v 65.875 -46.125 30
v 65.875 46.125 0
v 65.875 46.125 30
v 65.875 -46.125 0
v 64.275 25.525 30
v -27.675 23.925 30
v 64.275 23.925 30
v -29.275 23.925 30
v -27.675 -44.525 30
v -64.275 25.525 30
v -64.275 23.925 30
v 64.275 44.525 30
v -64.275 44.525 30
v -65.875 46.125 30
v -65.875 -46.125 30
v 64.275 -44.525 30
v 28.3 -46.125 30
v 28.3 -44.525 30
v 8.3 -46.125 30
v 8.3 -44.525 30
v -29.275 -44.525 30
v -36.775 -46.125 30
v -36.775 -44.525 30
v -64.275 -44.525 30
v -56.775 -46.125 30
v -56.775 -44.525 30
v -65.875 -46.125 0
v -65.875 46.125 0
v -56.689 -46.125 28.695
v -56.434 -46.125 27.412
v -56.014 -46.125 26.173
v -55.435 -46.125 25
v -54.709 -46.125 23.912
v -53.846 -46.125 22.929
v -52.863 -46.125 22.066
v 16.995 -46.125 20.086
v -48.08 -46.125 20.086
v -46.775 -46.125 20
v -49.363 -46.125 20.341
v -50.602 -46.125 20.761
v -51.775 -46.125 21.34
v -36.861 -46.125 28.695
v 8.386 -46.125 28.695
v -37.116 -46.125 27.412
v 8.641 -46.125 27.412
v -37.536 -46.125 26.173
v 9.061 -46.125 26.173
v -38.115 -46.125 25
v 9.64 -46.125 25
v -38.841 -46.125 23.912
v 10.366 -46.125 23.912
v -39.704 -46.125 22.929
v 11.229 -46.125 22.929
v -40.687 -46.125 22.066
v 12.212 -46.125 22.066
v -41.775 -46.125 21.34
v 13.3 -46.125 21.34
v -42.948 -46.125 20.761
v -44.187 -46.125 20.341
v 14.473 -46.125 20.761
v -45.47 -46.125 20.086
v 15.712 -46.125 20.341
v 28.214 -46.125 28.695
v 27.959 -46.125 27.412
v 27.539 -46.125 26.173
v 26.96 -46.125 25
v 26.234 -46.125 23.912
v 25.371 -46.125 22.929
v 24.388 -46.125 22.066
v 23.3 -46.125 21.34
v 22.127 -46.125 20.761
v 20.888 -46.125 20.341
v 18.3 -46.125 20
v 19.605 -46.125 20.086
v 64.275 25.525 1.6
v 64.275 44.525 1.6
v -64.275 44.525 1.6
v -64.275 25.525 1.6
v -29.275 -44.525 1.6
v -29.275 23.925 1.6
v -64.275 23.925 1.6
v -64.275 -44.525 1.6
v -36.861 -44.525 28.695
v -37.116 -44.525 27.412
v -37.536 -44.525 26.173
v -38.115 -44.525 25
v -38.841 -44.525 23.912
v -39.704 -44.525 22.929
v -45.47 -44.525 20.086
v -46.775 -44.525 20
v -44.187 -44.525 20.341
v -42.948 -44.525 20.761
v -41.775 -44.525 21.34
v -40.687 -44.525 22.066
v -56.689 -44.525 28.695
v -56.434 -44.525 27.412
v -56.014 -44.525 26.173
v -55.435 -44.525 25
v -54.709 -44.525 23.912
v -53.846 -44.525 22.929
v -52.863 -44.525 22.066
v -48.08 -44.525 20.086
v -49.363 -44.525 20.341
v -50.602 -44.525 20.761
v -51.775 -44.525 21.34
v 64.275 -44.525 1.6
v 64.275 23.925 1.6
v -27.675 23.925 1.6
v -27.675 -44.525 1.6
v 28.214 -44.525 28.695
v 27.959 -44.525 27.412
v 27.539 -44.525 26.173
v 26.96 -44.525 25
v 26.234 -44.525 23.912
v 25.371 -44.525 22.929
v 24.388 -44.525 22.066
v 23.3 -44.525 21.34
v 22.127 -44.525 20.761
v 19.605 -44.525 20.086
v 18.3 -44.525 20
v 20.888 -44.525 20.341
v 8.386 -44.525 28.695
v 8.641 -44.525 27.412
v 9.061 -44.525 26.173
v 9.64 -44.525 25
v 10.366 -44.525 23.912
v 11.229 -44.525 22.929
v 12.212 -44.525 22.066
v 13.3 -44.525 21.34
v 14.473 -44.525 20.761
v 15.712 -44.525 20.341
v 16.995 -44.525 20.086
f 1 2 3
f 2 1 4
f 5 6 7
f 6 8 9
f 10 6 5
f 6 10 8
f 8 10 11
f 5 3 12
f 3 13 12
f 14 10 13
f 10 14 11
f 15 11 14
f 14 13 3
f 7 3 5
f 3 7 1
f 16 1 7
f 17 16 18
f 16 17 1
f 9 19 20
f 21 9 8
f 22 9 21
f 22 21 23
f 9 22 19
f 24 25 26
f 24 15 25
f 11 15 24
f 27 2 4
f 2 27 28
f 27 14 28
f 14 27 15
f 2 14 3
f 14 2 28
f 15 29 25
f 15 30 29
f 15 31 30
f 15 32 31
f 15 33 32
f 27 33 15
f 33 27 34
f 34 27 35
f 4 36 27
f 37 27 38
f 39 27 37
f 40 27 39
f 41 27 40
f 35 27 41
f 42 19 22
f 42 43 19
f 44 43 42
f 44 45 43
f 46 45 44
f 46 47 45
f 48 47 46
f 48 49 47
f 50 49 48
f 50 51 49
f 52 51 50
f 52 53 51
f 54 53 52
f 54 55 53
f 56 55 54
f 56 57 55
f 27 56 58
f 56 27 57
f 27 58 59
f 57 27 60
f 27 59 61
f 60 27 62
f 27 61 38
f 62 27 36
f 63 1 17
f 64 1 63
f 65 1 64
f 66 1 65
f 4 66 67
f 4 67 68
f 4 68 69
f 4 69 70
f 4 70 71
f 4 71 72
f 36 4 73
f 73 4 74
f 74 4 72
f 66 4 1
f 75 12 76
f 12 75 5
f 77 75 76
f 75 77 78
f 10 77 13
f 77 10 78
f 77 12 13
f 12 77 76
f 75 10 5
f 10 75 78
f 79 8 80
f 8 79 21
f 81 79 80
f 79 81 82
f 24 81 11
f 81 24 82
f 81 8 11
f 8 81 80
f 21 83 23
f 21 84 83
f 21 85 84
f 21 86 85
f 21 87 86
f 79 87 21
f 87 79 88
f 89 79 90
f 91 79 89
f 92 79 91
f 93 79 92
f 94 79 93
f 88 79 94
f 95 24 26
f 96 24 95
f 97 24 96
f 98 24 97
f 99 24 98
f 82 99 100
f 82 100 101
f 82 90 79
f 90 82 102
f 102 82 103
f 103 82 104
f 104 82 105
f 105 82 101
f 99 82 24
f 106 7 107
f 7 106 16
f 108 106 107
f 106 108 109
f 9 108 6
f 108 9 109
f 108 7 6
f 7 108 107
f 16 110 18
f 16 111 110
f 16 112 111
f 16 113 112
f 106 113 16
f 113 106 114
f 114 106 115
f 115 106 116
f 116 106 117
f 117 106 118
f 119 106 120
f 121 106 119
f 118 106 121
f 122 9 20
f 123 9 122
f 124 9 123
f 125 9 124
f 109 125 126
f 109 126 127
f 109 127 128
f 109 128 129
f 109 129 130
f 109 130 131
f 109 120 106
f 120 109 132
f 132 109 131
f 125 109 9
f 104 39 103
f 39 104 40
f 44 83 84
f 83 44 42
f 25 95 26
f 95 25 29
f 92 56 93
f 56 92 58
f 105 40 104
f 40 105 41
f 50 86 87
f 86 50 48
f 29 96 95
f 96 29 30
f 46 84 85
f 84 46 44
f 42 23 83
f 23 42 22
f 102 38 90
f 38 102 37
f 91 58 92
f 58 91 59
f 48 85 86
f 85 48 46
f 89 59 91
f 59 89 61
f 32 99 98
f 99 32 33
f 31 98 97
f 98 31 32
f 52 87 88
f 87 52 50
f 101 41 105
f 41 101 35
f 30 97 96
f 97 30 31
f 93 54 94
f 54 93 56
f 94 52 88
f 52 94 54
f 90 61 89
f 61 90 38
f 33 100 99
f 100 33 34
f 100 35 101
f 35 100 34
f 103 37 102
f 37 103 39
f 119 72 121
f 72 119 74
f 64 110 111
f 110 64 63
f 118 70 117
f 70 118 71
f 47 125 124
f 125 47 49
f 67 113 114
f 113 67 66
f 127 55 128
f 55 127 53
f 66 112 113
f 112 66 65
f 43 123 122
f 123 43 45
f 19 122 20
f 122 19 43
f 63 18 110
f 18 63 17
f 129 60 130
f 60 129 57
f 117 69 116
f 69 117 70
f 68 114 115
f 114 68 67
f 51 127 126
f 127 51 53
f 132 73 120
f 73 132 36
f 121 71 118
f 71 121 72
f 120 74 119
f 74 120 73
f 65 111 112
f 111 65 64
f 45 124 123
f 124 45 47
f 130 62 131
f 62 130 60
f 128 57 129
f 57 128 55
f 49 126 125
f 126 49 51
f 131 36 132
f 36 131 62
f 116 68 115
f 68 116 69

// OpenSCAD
// file: ../lib/label.scad
// SPDX-License-Identifier: MIT
// Copyright (c) 2026 Aaron Cupp
//
// label.scad — two-colour flat-inset text labels, shared across the bench system.
//
// Generalizes the technique proven in donation-qr-stand/: the text is a recessed
// pocket in the light part, filled flush by a matching inlay printed in the dark
// colour. On a multi-toolhead printer (Snapmaker U1) load both parts at the same
// origin and assign a colour to each. Flush beats raised relief — nothing to
// catch, nothing to peel, and it survives an IPA wipe, which a printed sticker
// does not.
//
// Both modules emit the label occupying z ∈ [-LABEL_T, 0], so the caller
// translates to the face being labelled and the inlay tops out flush:
//
//     difference() { my_bin(); translate([0, 30, top_z]) label_pocket("0.45"); }
//     translate([0, 30, top_z]) label_inlay("0.45");            // dark part
//
// Single-colour fallback: label_pocket() alone gives an engraved label that
// still reads, just without the contrast.

LABEL_T    = 0.8;                            // pocket depth = inlay thickness
LABEL_FONT = "Liberation Sans:style=Bold";   // renders locally and in CI
_L_EPS     = 0.02;                           // pocket overrun so difference() is clean

// 2D text outline, centred on the origin by default.
module label_2d(txt, size = 6, font = LABEL_FONT, halign = "center", valign = "center") {
    text(txt, size = size, font = font, halign = halign, valign = valign);
}

// Solid to SUBTRACT from the light part. Overruns the face so the cut is clean.
module label_pocket(txt, size = 6, depth = LABEL_T, font = LABEL_FONT,
                    halign = "center", valign = "center") {
    translate([0, 0, -depth])
        linear_extrude(depth + _L_EPS) label_2d(txt, size, font, halign, valign);
}

// Solid to ADD to the dark part. Fills the pocket flush — no overrun.
module label_inlay(txt, size = 6, depth = LABEL_T, font = LABEL_FONT,
                   halign = "center", valign = "center") {
    translate([0, 0, -depth])
        linear_extrude(depth) label_2d(txt, size, font, halign, valign);
}

// Same pair for a text label on a VERTICAL face (bin front, divider tab), where
// the labelled surface faces +Y. Label occupies y ∈ [-LABEL_T, 0].
module label_pocket_v(txt, size = 6, depth = LABEL_T, font = LABEL_FONT) {
    rotate([90, 0, 0]) translate([0, 0, -_L_EPS])
        linear_extrude(depth + _L_EPS) label_2d(txt, size, font);
}

module label_inlay_v(txt, size = 6, depth = LABEL_T, font = LABEL_FONT) {
    rotate([90, 0, 0]) linear_extrude(depth) label_2d(txt, size, font);
}
// main file
// rig_storage_bin.scad — a three-bay bin glued to the cup's deck for the riser kit.
//
// Replaces the riser dock. The dock's pegs sat on the calipered 99 x 37 hole
// pitch, which was never coupon-tested for pitch, and it was wrong in both
// directions on the printed cup (2026-10-01). Not reprinting the cup, so the
// kit stores in a bin on top instead:
//
//   rear bay    the x16 board on its long edge (slot 17 + clearance, 126.55 long),
//               standing 43.20 — sticks up ~13 above the 30 mm walls to grab
//   front-left  the x1 card, lying flat in a 33 x 31 bay
//   front-right the USB 3.0 lead, coiled in whatever is left
//
// Glued flat on the deck, its back edge flush with the deck's back edge. NO
// locating tabs into the empty rail pockets: with tabs the bin would print
// standing on two small pads and its whole floor would bridge between them —
// the exact failure that scrapped two bases. Floor on the bed, nothing bridges.
//
// Print as emitted: floor down, no supports. PETG.

include <rig_common.scad>

/* [Measured] */
X16_L = 126.55;  X16_T = 17;   // board on edge: length, thickness lying flat (user 2026-10-01)
X1_W  = 33;      X1_D  = 31;   // x1 card bay (user 2026-10-01)

/* [Bin] */
BW    = 1.6;      // walls and dividers — four 0.4 lines
BF    = 1.6;      // floor
BH    = 30;       // wall height; the x16 board stands 43.20
BCLR  = 1.0;      // per side
FRONT_CLEAR = 5;  // gap to the meter bezel's back edge

ROW1  = X16_T + 2*BCLR;                    // 19 — x16 slot
LEN   = X16_L + 2*BCLR;                    // 128.55 inner length
OW    = LEN + 2*BW;                        // 131.75
BEZEL_BACK = METER_Y + 49/2;               // -13.5, the meter bezel's back edge
OD    = D/2 - (BEZEL_BACK + FRONT_CLEAR);  // as deep as the deck allows
ROW2  = OD - ROW1 - 3*BW;                  // front row depth
X1_BAY = X1_W + 2*BCLR;                    // 35
BIN_X = RISER_X;                           // where the dock was
BIN_Y = D/2 - OD/2;                        // back edge flush with the deck's

module scoop(x, y_wall) { translate([x, y_wall, BH]) rotate([90, 0, 0]) cylinder(r = 10, h = BW*4, center = true); }

module rig_storage_bin() {
    difference() {
        translate([-OW/2, -OD/2, 0]) cube([OW, OD, BH]);
        // rear bay: x16 board on its long edge
        translate([-LEN/2, OD/2 - BW - ROW1, BF]) cube([LEN, ROW1, BH]);
        // front-left: x1 card, flat
        translate([-LEN/2, -OD/2 + BW, BF]) cube([X1_BAY, ROW2, BH]);
        // front-right: USB lead
        translate([-LEN/2 + X1_BAY + BW, -OD/2 + BW, BF]) cube([LEN - X1_BAY - BW, ROW2, BH]);
        // finger scoops in the front wall of both front bays
        scoop(-LEN/2 + X1_BAY/2, -OD/2 + BW/2);
        scoop(-LEN/2 + X1_BAY + BW + (LEN - X1_BAY - BW)/2, -OD/2 + BW/2);
    }
}

rig_storage_bin();

assert(ROW2 >= X1_D + 2*BCLR, "front row too shallow for the x1 card");
assert(abs(BIN_X) + OW/2 <= W/2, "bin overhangs the deck's side edge");
assert(BIN_Y - OD/2 >= BEZEL_BACK + FRONT_CLEAR - 0.01, "bin sits on the meter bezel");
assert(BIN_X + OW/2 < SW_X - 23/2 || BIN_Y - OD/2 > SW_Y + 23/2, "bin sits on the rocker bezel");
echo(str("rig_storage_bin: ", OW, " x ", OD, " x ", BH, " mm; x16 slot ", ROW1, ", x1 bay ", X1_BAY, " x ", ROW2, ", USB bay ", LEN - X1_BAY - BW, " x ", ROW2, "; deck position x=", BIN_X, " y=", BIN_Y));
